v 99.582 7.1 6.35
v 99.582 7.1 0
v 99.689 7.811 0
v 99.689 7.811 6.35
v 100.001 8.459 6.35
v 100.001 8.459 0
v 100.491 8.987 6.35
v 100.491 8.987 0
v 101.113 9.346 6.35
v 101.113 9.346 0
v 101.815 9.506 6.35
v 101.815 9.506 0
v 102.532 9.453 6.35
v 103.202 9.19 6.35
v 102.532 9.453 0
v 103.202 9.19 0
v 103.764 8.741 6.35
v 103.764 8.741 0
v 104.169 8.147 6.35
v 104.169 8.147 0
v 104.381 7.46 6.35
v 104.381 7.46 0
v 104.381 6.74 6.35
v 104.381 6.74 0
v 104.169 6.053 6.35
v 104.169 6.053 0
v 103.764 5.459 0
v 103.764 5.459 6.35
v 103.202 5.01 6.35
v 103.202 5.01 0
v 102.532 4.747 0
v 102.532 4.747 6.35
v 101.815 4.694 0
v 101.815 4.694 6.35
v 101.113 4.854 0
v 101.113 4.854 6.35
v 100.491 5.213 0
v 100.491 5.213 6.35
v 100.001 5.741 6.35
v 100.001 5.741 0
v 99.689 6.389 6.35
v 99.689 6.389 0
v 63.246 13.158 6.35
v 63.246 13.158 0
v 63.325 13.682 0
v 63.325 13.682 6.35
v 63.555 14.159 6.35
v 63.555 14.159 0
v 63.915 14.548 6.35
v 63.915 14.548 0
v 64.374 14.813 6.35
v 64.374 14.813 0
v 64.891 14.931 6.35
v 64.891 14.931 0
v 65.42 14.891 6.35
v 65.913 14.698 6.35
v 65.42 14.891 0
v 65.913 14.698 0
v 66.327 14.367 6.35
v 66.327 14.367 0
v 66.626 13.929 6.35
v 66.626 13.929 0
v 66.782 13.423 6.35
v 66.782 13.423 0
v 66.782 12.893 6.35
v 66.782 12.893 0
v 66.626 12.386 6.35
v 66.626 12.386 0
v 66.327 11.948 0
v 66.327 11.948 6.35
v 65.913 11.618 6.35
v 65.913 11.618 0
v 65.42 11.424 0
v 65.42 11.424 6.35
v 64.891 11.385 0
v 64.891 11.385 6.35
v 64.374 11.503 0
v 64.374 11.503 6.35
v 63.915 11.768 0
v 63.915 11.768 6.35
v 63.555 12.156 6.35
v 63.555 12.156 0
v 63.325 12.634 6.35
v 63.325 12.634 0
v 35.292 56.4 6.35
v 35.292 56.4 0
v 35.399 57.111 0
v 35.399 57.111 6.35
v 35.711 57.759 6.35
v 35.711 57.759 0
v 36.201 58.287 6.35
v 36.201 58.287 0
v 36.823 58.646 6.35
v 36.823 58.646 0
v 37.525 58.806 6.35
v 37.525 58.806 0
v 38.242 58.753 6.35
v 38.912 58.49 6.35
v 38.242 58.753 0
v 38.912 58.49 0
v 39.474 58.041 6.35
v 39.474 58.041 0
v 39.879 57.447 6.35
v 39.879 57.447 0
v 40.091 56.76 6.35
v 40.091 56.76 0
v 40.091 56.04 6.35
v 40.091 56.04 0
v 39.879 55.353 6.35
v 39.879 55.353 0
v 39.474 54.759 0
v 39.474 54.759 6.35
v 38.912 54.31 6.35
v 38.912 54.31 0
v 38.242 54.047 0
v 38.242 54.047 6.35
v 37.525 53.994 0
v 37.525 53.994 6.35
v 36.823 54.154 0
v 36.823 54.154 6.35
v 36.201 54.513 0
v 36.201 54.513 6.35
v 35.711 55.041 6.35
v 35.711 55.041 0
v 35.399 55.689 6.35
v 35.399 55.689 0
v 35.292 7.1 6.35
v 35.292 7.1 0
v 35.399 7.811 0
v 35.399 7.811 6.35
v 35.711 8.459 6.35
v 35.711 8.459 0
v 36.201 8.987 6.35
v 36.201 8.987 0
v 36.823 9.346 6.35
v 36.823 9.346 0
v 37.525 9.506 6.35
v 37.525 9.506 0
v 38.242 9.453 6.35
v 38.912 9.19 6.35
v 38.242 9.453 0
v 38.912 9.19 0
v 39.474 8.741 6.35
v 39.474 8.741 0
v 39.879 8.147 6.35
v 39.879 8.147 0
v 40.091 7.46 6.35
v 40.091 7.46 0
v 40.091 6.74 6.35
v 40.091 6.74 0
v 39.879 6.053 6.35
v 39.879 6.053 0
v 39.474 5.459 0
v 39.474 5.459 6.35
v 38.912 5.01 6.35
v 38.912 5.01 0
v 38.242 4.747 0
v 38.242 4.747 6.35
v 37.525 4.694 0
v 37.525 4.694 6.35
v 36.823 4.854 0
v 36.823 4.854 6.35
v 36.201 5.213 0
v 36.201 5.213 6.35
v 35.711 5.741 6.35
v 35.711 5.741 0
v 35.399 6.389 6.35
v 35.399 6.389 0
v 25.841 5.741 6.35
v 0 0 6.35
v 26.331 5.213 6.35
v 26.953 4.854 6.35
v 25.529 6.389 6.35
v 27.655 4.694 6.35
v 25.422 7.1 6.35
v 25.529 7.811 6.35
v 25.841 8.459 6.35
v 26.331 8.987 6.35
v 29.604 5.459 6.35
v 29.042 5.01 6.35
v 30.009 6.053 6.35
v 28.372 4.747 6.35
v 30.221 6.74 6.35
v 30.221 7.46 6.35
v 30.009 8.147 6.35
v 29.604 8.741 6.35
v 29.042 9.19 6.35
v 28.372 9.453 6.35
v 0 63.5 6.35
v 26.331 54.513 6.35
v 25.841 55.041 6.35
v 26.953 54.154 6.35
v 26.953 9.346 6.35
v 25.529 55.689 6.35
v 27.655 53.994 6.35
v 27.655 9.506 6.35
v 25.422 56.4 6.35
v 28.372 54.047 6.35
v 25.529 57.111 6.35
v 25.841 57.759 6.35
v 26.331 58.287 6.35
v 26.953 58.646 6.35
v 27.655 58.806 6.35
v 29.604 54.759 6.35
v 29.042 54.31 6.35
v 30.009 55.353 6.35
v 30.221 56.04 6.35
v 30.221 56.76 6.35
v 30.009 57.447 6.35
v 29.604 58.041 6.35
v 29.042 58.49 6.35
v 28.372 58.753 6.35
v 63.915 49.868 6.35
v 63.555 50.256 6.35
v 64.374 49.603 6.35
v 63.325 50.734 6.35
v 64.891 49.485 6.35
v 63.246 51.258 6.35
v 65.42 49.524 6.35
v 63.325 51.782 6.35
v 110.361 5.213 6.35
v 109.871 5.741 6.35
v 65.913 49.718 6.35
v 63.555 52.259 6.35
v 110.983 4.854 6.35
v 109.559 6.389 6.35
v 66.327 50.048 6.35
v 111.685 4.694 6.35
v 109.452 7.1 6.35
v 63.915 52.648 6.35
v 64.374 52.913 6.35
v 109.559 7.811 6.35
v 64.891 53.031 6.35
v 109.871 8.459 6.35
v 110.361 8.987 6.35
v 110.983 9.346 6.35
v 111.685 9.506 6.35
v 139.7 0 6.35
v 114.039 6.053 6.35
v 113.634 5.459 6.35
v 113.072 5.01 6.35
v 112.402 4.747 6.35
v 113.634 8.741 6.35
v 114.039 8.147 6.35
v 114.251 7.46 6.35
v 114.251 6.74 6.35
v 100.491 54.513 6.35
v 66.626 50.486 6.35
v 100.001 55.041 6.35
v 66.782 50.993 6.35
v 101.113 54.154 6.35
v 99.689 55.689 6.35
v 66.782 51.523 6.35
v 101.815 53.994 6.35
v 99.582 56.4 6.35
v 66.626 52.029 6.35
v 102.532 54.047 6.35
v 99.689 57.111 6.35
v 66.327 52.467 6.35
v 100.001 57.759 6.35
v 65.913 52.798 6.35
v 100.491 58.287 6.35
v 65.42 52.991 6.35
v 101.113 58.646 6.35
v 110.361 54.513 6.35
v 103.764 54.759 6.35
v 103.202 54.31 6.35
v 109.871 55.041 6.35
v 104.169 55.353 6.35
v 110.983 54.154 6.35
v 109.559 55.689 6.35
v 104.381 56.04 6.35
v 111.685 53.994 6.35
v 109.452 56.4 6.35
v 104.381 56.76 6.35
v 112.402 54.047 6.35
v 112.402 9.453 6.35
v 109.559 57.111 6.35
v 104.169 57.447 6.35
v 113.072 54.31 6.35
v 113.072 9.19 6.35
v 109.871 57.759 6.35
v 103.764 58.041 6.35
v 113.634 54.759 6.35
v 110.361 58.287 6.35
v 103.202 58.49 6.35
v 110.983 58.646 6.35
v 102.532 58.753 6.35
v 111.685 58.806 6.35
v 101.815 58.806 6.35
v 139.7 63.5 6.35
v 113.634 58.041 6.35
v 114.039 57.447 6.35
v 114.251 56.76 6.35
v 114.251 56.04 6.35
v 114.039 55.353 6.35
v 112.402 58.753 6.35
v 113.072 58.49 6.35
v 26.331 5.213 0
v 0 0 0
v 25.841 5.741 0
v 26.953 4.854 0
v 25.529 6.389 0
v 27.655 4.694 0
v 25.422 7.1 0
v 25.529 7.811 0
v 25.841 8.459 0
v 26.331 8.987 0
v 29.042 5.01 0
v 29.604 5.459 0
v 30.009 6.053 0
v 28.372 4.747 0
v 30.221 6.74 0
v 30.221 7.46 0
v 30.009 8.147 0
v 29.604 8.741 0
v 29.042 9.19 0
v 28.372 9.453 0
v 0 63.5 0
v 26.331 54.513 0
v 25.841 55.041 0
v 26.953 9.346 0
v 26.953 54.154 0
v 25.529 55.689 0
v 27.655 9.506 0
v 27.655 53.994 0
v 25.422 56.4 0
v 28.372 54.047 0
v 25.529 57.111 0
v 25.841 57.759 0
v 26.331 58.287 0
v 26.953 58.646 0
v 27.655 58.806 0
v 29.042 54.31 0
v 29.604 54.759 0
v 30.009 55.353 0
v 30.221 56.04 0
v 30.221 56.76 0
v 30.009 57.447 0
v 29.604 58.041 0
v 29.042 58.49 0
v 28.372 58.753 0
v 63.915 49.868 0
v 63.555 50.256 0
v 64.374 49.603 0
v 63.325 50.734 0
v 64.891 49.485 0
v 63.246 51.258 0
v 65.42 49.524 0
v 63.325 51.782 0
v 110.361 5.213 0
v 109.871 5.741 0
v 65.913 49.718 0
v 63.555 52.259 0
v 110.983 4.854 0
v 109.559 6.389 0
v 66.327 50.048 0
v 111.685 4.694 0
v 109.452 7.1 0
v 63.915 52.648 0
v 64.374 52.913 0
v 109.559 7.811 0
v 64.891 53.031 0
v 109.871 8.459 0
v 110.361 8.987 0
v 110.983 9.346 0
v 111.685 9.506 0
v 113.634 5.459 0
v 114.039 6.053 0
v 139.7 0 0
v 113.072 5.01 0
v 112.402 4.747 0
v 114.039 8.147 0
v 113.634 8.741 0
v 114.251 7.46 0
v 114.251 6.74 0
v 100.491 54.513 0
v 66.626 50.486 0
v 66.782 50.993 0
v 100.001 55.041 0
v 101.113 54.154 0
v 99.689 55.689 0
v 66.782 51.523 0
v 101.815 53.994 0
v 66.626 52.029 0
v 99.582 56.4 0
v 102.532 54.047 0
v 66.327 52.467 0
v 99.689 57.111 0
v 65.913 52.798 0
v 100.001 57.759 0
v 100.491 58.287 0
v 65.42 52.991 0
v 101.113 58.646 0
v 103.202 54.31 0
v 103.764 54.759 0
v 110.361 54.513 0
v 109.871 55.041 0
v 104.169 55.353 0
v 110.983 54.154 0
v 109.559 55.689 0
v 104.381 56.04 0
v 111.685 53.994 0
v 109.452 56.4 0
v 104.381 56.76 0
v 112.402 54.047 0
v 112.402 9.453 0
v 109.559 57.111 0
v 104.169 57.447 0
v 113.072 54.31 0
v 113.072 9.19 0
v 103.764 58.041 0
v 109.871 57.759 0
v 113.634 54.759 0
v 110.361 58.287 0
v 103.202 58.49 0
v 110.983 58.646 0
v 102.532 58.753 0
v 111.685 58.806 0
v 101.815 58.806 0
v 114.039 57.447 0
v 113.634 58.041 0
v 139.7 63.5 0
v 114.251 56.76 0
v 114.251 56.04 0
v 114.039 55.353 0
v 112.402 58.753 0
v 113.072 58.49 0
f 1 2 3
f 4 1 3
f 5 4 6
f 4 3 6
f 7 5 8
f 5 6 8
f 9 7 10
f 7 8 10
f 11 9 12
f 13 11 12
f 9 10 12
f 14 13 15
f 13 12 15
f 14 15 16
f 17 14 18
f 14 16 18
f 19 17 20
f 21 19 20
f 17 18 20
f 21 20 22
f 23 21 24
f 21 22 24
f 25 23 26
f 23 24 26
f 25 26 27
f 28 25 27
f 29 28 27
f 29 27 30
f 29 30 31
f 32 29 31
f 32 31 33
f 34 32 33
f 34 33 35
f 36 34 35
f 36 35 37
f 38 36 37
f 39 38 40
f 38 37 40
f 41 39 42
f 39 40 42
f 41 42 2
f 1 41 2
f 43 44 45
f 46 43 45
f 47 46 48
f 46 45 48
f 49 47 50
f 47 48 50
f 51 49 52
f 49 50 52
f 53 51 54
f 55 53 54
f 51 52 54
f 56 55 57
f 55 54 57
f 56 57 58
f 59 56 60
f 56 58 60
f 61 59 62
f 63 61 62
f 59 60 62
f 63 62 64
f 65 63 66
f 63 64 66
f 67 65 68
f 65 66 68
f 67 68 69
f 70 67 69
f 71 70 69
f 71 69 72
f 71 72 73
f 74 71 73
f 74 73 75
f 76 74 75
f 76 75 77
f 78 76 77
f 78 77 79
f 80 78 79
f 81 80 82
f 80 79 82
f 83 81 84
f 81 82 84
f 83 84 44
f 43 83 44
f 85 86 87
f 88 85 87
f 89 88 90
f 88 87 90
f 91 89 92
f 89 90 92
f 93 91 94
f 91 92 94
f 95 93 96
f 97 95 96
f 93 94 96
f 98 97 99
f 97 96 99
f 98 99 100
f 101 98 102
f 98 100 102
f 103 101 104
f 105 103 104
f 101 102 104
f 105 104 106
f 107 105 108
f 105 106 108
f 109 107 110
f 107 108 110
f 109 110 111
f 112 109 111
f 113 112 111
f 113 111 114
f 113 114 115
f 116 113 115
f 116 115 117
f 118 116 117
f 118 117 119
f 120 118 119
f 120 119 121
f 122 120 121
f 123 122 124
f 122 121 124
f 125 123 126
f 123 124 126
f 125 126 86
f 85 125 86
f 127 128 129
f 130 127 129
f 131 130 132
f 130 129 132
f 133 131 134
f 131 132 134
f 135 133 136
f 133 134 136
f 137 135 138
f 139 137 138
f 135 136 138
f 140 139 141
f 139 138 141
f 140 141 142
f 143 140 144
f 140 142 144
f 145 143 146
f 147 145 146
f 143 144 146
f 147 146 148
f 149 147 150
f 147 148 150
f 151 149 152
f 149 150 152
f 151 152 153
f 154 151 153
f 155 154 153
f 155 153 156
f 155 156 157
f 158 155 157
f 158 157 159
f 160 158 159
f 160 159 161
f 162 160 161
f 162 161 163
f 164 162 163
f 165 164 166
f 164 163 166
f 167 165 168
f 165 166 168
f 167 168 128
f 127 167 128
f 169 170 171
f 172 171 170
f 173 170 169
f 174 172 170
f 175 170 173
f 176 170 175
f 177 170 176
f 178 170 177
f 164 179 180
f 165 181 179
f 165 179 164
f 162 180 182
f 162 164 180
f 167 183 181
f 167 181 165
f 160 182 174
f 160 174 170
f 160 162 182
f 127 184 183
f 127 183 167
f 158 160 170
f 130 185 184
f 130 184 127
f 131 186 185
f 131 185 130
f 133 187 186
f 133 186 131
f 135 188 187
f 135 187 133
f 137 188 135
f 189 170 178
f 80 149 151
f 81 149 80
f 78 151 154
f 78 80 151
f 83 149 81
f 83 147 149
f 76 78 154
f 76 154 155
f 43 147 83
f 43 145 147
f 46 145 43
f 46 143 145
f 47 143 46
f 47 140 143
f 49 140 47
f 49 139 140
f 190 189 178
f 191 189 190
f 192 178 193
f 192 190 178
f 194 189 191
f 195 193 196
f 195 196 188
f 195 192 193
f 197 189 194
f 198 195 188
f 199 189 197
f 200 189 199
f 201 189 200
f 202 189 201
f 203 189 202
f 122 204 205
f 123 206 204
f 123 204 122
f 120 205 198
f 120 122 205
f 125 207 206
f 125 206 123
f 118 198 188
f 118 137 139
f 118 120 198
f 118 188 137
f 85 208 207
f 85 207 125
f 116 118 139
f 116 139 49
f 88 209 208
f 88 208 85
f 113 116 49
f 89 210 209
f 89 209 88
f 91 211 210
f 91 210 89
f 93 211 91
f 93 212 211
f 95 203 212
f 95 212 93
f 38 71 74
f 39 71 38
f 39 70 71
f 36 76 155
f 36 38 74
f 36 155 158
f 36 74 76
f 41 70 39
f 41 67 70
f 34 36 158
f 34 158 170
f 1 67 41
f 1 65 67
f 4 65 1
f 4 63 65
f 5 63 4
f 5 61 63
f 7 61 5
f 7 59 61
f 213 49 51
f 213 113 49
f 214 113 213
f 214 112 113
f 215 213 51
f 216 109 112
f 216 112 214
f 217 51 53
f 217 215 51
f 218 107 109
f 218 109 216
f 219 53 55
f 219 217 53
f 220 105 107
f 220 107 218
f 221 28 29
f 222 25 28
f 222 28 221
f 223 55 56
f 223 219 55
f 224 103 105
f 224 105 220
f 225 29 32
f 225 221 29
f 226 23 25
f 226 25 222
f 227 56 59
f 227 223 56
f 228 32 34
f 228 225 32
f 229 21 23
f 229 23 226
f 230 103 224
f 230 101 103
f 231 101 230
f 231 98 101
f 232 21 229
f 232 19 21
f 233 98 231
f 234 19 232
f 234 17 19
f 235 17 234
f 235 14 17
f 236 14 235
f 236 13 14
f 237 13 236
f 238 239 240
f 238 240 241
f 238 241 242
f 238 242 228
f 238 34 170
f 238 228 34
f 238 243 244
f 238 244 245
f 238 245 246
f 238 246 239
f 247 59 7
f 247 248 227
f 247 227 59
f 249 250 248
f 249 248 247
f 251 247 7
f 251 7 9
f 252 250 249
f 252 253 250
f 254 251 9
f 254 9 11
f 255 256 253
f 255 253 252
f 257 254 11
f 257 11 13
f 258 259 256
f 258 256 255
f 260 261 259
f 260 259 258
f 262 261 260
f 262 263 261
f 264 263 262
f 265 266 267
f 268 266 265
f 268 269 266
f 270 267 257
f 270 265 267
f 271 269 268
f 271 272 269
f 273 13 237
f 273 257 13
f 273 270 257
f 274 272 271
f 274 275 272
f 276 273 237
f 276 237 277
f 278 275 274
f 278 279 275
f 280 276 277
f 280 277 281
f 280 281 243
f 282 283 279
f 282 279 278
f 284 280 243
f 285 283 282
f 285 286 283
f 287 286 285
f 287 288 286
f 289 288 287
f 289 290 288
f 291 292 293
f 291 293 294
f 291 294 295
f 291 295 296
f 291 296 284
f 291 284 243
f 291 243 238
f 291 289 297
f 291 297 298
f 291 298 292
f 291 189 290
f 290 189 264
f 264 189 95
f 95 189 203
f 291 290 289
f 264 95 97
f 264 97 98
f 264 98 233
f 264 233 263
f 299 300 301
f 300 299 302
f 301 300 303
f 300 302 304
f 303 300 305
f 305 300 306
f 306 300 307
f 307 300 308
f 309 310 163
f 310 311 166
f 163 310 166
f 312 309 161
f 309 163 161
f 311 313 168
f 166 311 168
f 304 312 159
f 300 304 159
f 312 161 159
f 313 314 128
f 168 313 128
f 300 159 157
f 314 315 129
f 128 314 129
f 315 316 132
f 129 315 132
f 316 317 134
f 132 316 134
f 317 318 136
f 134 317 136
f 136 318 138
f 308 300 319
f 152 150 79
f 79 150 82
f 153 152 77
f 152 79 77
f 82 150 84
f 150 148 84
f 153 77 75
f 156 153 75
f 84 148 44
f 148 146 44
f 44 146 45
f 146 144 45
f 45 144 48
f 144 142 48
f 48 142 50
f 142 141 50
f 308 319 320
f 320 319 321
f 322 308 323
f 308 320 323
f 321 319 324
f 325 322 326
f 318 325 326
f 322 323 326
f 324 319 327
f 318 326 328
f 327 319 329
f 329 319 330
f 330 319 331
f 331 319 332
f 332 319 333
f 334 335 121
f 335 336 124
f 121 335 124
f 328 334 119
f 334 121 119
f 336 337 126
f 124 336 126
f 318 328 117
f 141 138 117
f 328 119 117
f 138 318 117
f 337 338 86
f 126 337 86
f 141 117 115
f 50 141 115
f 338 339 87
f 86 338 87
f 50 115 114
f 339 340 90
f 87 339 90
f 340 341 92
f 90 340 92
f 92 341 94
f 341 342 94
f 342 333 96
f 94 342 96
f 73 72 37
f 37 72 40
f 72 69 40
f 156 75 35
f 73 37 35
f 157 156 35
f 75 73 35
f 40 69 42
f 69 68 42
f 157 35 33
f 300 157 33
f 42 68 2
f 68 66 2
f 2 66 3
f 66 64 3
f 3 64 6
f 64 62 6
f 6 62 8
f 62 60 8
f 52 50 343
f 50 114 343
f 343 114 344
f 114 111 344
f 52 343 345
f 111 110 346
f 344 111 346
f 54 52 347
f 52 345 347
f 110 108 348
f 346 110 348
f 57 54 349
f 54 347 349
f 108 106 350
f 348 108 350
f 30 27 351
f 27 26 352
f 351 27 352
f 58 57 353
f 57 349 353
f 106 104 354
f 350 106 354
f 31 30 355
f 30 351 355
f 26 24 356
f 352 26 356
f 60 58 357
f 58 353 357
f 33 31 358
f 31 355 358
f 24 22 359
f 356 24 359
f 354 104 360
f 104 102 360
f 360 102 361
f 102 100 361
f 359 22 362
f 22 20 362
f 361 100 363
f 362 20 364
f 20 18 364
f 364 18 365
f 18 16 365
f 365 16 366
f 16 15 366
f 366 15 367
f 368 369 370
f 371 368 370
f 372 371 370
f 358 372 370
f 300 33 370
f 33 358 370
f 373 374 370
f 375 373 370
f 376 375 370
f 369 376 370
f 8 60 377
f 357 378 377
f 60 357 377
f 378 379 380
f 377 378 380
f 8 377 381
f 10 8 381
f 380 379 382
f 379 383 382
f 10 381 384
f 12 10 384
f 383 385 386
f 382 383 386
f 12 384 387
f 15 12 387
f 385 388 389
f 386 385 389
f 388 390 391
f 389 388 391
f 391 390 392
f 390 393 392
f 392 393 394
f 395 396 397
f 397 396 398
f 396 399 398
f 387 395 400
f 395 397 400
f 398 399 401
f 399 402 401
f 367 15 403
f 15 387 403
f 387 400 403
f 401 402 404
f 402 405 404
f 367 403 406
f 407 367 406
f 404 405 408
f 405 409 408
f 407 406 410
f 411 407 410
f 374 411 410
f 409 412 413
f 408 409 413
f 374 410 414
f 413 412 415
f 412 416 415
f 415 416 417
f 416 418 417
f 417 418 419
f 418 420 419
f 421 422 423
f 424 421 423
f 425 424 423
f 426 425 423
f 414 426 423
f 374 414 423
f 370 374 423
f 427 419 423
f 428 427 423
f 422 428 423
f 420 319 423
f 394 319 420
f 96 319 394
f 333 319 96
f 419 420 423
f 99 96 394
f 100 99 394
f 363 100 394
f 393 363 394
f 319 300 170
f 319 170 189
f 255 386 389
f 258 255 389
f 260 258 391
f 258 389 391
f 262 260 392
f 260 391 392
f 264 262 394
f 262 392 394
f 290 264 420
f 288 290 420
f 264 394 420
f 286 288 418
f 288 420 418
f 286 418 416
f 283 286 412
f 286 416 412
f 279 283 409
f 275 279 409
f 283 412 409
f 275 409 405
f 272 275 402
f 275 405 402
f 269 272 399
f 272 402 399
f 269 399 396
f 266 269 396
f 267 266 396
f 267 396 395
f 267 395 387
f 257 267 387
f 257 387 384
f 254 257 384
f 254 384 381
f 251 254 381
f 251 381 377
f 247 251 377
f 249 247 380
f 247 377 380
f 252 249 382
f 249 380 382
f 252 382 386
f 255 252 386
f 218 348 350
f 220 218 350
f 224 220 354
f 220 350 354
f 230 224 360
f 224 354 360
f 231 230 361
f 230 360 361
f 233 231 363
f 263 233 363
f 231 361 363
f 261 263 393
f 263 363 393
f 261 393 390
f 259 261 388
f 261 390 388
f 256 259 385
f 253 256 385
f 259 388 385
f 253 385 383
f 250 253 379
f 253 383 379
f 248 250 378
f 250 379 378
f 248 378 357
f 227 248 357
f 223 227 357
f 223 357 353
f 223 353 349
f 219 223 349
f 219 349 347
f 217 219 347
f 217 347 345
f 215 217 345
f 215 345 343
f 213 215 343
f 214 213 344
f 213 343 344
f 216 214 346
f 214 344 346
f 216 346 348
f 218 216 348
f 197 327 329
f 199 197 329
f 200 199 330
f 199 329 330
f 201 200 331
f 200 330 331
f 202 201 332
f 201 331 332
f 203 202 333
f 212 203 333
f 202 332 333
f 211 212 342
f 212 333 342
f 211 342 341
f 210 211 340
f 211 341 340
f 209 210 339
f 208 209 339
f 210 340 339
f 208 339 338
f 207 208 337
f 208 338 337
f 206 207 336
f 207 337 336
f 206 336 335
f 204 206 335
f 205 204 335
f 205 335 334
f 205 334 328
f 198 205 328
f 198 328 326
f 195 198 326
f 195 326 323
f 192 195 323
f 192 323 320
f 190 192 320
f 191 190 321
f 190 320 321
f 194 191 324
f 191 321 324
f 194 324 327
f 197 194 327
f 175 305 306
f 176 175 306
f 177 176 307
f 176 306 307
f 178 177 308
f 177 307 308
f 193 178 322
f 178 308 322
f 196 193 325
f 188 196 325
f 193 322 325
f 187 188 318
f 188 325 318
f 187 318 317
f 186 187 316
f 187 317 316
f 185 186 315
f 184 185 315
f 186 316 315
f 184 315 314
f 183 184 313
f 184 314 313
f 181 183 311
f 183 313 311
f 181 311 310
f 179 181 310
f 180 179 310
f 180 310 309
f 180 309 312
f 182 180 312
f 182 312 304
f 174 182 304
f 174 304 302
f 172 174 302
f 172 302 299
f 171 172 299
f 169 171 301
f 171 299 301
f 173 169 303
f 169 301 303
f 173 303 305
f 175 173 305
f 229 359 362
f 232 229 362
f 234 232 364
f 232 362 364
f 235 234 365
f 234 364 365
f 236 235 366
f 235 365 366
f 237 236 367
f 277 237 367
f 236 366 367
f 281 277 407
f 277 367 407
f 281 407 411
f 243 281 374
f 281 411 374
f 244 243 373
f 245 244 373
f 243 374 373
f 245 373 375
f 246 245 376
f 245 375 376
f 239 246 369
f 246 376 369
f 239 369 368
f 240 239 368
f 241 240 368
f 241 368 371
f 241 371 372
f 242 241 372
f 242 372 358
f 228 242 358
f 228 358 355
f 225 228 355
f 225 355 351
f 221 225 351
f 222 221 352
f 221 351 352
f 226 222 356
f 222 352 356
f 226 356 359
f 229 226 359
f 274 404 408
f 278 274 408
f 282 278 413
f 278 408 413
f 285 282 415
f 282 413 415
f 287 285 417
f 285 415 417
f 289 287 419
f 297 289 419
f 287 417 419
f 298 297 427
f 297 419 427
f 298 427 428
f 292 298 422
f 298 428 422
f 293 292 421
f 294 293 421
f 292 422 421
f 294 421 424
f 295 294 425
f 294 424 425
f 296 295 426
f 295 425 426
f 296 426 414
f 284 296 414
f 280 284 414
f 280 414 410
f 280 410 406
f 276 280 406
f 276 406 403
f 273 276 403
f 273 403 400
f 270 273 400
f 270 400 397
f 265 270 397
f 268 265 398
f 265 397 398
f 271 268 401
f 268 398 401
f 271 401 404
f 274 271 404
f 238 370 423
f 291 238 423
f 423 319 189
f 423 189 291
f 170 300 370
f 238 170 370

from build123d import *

# Parameters (mm, degrees)
SKETCH1_W           = 139.7
SKETCH1_H           = 63.5
BOSS_EXTRUDE1_DEPTH = 6.35
SKETCH2_R           = 1.778
CUT_EXTRUDE1_DEPTH  = 6.35
SKETCH3_R           = 2.413
CUT_EXTRUDE2_DEPTH  = 6.35


with BuildPart() as part:
    # Sketch1 → Boss-Extrude1 (new body)
    with BuildSketch(Plane.XY):
        with Locations((69.85, 31.75)):
            Rectangle(SKETCH1_W, SKETCH1_H)
    extrude(amount=BOSS_EXTRUDE1_DEPTH)

    # Sketch2 → Cut-Extrude1 (cut)
    with BuildSketch(Plane(origin=(0, 0, 0), x_dir=(-1, 0, 0), z_dir=(0, 0, -1))):
        with Locations((-65.024, 13.15775)):
            Circle(SKETCH2_R)
        with Locations((-65.024, 51.25775)):
            Circle(SKETCH2_R)
    extrude(amount=-CUT_EXTRUDE1_DEPTH, mode=Mode.SUBTRACT)

    # Sketch3 → Cut-Extrude2 (cut)
    with BuildSketch(Plane(origin=(0, 0, 0), x_dir=(-1, 0, 0), z_dir=(0, 0, -1))):
        with Locations((-111.865, 7.1)):
            Circle(SKETCH3_R)
        with Locations((-101.995, 7.1)):
            Circle(SKETCH3_R)
        with Locations((-111.865, 56.4)):
            Circle(SKETCH3_R)
        with Locations((-101.995, 56.4)):
            Circle(SKETCH3_R)
        with Locations((-37.705, 56.4)):
            Circle(SKETCH3_R)
        with Locations((-27.835, 56.4)):
            Circle(SKETCH3_R)
        with Locations((-27.835, 7.1)):
            Circle(SKETCH3_R)
        with Locations((-37.705, 7.1)):
            Circle(SKETCH3_R)
    extrude(amount=-CUT_EXTRUDE2_DEPTH, mode=Mode.SUBTRACT)


solid = part.part
